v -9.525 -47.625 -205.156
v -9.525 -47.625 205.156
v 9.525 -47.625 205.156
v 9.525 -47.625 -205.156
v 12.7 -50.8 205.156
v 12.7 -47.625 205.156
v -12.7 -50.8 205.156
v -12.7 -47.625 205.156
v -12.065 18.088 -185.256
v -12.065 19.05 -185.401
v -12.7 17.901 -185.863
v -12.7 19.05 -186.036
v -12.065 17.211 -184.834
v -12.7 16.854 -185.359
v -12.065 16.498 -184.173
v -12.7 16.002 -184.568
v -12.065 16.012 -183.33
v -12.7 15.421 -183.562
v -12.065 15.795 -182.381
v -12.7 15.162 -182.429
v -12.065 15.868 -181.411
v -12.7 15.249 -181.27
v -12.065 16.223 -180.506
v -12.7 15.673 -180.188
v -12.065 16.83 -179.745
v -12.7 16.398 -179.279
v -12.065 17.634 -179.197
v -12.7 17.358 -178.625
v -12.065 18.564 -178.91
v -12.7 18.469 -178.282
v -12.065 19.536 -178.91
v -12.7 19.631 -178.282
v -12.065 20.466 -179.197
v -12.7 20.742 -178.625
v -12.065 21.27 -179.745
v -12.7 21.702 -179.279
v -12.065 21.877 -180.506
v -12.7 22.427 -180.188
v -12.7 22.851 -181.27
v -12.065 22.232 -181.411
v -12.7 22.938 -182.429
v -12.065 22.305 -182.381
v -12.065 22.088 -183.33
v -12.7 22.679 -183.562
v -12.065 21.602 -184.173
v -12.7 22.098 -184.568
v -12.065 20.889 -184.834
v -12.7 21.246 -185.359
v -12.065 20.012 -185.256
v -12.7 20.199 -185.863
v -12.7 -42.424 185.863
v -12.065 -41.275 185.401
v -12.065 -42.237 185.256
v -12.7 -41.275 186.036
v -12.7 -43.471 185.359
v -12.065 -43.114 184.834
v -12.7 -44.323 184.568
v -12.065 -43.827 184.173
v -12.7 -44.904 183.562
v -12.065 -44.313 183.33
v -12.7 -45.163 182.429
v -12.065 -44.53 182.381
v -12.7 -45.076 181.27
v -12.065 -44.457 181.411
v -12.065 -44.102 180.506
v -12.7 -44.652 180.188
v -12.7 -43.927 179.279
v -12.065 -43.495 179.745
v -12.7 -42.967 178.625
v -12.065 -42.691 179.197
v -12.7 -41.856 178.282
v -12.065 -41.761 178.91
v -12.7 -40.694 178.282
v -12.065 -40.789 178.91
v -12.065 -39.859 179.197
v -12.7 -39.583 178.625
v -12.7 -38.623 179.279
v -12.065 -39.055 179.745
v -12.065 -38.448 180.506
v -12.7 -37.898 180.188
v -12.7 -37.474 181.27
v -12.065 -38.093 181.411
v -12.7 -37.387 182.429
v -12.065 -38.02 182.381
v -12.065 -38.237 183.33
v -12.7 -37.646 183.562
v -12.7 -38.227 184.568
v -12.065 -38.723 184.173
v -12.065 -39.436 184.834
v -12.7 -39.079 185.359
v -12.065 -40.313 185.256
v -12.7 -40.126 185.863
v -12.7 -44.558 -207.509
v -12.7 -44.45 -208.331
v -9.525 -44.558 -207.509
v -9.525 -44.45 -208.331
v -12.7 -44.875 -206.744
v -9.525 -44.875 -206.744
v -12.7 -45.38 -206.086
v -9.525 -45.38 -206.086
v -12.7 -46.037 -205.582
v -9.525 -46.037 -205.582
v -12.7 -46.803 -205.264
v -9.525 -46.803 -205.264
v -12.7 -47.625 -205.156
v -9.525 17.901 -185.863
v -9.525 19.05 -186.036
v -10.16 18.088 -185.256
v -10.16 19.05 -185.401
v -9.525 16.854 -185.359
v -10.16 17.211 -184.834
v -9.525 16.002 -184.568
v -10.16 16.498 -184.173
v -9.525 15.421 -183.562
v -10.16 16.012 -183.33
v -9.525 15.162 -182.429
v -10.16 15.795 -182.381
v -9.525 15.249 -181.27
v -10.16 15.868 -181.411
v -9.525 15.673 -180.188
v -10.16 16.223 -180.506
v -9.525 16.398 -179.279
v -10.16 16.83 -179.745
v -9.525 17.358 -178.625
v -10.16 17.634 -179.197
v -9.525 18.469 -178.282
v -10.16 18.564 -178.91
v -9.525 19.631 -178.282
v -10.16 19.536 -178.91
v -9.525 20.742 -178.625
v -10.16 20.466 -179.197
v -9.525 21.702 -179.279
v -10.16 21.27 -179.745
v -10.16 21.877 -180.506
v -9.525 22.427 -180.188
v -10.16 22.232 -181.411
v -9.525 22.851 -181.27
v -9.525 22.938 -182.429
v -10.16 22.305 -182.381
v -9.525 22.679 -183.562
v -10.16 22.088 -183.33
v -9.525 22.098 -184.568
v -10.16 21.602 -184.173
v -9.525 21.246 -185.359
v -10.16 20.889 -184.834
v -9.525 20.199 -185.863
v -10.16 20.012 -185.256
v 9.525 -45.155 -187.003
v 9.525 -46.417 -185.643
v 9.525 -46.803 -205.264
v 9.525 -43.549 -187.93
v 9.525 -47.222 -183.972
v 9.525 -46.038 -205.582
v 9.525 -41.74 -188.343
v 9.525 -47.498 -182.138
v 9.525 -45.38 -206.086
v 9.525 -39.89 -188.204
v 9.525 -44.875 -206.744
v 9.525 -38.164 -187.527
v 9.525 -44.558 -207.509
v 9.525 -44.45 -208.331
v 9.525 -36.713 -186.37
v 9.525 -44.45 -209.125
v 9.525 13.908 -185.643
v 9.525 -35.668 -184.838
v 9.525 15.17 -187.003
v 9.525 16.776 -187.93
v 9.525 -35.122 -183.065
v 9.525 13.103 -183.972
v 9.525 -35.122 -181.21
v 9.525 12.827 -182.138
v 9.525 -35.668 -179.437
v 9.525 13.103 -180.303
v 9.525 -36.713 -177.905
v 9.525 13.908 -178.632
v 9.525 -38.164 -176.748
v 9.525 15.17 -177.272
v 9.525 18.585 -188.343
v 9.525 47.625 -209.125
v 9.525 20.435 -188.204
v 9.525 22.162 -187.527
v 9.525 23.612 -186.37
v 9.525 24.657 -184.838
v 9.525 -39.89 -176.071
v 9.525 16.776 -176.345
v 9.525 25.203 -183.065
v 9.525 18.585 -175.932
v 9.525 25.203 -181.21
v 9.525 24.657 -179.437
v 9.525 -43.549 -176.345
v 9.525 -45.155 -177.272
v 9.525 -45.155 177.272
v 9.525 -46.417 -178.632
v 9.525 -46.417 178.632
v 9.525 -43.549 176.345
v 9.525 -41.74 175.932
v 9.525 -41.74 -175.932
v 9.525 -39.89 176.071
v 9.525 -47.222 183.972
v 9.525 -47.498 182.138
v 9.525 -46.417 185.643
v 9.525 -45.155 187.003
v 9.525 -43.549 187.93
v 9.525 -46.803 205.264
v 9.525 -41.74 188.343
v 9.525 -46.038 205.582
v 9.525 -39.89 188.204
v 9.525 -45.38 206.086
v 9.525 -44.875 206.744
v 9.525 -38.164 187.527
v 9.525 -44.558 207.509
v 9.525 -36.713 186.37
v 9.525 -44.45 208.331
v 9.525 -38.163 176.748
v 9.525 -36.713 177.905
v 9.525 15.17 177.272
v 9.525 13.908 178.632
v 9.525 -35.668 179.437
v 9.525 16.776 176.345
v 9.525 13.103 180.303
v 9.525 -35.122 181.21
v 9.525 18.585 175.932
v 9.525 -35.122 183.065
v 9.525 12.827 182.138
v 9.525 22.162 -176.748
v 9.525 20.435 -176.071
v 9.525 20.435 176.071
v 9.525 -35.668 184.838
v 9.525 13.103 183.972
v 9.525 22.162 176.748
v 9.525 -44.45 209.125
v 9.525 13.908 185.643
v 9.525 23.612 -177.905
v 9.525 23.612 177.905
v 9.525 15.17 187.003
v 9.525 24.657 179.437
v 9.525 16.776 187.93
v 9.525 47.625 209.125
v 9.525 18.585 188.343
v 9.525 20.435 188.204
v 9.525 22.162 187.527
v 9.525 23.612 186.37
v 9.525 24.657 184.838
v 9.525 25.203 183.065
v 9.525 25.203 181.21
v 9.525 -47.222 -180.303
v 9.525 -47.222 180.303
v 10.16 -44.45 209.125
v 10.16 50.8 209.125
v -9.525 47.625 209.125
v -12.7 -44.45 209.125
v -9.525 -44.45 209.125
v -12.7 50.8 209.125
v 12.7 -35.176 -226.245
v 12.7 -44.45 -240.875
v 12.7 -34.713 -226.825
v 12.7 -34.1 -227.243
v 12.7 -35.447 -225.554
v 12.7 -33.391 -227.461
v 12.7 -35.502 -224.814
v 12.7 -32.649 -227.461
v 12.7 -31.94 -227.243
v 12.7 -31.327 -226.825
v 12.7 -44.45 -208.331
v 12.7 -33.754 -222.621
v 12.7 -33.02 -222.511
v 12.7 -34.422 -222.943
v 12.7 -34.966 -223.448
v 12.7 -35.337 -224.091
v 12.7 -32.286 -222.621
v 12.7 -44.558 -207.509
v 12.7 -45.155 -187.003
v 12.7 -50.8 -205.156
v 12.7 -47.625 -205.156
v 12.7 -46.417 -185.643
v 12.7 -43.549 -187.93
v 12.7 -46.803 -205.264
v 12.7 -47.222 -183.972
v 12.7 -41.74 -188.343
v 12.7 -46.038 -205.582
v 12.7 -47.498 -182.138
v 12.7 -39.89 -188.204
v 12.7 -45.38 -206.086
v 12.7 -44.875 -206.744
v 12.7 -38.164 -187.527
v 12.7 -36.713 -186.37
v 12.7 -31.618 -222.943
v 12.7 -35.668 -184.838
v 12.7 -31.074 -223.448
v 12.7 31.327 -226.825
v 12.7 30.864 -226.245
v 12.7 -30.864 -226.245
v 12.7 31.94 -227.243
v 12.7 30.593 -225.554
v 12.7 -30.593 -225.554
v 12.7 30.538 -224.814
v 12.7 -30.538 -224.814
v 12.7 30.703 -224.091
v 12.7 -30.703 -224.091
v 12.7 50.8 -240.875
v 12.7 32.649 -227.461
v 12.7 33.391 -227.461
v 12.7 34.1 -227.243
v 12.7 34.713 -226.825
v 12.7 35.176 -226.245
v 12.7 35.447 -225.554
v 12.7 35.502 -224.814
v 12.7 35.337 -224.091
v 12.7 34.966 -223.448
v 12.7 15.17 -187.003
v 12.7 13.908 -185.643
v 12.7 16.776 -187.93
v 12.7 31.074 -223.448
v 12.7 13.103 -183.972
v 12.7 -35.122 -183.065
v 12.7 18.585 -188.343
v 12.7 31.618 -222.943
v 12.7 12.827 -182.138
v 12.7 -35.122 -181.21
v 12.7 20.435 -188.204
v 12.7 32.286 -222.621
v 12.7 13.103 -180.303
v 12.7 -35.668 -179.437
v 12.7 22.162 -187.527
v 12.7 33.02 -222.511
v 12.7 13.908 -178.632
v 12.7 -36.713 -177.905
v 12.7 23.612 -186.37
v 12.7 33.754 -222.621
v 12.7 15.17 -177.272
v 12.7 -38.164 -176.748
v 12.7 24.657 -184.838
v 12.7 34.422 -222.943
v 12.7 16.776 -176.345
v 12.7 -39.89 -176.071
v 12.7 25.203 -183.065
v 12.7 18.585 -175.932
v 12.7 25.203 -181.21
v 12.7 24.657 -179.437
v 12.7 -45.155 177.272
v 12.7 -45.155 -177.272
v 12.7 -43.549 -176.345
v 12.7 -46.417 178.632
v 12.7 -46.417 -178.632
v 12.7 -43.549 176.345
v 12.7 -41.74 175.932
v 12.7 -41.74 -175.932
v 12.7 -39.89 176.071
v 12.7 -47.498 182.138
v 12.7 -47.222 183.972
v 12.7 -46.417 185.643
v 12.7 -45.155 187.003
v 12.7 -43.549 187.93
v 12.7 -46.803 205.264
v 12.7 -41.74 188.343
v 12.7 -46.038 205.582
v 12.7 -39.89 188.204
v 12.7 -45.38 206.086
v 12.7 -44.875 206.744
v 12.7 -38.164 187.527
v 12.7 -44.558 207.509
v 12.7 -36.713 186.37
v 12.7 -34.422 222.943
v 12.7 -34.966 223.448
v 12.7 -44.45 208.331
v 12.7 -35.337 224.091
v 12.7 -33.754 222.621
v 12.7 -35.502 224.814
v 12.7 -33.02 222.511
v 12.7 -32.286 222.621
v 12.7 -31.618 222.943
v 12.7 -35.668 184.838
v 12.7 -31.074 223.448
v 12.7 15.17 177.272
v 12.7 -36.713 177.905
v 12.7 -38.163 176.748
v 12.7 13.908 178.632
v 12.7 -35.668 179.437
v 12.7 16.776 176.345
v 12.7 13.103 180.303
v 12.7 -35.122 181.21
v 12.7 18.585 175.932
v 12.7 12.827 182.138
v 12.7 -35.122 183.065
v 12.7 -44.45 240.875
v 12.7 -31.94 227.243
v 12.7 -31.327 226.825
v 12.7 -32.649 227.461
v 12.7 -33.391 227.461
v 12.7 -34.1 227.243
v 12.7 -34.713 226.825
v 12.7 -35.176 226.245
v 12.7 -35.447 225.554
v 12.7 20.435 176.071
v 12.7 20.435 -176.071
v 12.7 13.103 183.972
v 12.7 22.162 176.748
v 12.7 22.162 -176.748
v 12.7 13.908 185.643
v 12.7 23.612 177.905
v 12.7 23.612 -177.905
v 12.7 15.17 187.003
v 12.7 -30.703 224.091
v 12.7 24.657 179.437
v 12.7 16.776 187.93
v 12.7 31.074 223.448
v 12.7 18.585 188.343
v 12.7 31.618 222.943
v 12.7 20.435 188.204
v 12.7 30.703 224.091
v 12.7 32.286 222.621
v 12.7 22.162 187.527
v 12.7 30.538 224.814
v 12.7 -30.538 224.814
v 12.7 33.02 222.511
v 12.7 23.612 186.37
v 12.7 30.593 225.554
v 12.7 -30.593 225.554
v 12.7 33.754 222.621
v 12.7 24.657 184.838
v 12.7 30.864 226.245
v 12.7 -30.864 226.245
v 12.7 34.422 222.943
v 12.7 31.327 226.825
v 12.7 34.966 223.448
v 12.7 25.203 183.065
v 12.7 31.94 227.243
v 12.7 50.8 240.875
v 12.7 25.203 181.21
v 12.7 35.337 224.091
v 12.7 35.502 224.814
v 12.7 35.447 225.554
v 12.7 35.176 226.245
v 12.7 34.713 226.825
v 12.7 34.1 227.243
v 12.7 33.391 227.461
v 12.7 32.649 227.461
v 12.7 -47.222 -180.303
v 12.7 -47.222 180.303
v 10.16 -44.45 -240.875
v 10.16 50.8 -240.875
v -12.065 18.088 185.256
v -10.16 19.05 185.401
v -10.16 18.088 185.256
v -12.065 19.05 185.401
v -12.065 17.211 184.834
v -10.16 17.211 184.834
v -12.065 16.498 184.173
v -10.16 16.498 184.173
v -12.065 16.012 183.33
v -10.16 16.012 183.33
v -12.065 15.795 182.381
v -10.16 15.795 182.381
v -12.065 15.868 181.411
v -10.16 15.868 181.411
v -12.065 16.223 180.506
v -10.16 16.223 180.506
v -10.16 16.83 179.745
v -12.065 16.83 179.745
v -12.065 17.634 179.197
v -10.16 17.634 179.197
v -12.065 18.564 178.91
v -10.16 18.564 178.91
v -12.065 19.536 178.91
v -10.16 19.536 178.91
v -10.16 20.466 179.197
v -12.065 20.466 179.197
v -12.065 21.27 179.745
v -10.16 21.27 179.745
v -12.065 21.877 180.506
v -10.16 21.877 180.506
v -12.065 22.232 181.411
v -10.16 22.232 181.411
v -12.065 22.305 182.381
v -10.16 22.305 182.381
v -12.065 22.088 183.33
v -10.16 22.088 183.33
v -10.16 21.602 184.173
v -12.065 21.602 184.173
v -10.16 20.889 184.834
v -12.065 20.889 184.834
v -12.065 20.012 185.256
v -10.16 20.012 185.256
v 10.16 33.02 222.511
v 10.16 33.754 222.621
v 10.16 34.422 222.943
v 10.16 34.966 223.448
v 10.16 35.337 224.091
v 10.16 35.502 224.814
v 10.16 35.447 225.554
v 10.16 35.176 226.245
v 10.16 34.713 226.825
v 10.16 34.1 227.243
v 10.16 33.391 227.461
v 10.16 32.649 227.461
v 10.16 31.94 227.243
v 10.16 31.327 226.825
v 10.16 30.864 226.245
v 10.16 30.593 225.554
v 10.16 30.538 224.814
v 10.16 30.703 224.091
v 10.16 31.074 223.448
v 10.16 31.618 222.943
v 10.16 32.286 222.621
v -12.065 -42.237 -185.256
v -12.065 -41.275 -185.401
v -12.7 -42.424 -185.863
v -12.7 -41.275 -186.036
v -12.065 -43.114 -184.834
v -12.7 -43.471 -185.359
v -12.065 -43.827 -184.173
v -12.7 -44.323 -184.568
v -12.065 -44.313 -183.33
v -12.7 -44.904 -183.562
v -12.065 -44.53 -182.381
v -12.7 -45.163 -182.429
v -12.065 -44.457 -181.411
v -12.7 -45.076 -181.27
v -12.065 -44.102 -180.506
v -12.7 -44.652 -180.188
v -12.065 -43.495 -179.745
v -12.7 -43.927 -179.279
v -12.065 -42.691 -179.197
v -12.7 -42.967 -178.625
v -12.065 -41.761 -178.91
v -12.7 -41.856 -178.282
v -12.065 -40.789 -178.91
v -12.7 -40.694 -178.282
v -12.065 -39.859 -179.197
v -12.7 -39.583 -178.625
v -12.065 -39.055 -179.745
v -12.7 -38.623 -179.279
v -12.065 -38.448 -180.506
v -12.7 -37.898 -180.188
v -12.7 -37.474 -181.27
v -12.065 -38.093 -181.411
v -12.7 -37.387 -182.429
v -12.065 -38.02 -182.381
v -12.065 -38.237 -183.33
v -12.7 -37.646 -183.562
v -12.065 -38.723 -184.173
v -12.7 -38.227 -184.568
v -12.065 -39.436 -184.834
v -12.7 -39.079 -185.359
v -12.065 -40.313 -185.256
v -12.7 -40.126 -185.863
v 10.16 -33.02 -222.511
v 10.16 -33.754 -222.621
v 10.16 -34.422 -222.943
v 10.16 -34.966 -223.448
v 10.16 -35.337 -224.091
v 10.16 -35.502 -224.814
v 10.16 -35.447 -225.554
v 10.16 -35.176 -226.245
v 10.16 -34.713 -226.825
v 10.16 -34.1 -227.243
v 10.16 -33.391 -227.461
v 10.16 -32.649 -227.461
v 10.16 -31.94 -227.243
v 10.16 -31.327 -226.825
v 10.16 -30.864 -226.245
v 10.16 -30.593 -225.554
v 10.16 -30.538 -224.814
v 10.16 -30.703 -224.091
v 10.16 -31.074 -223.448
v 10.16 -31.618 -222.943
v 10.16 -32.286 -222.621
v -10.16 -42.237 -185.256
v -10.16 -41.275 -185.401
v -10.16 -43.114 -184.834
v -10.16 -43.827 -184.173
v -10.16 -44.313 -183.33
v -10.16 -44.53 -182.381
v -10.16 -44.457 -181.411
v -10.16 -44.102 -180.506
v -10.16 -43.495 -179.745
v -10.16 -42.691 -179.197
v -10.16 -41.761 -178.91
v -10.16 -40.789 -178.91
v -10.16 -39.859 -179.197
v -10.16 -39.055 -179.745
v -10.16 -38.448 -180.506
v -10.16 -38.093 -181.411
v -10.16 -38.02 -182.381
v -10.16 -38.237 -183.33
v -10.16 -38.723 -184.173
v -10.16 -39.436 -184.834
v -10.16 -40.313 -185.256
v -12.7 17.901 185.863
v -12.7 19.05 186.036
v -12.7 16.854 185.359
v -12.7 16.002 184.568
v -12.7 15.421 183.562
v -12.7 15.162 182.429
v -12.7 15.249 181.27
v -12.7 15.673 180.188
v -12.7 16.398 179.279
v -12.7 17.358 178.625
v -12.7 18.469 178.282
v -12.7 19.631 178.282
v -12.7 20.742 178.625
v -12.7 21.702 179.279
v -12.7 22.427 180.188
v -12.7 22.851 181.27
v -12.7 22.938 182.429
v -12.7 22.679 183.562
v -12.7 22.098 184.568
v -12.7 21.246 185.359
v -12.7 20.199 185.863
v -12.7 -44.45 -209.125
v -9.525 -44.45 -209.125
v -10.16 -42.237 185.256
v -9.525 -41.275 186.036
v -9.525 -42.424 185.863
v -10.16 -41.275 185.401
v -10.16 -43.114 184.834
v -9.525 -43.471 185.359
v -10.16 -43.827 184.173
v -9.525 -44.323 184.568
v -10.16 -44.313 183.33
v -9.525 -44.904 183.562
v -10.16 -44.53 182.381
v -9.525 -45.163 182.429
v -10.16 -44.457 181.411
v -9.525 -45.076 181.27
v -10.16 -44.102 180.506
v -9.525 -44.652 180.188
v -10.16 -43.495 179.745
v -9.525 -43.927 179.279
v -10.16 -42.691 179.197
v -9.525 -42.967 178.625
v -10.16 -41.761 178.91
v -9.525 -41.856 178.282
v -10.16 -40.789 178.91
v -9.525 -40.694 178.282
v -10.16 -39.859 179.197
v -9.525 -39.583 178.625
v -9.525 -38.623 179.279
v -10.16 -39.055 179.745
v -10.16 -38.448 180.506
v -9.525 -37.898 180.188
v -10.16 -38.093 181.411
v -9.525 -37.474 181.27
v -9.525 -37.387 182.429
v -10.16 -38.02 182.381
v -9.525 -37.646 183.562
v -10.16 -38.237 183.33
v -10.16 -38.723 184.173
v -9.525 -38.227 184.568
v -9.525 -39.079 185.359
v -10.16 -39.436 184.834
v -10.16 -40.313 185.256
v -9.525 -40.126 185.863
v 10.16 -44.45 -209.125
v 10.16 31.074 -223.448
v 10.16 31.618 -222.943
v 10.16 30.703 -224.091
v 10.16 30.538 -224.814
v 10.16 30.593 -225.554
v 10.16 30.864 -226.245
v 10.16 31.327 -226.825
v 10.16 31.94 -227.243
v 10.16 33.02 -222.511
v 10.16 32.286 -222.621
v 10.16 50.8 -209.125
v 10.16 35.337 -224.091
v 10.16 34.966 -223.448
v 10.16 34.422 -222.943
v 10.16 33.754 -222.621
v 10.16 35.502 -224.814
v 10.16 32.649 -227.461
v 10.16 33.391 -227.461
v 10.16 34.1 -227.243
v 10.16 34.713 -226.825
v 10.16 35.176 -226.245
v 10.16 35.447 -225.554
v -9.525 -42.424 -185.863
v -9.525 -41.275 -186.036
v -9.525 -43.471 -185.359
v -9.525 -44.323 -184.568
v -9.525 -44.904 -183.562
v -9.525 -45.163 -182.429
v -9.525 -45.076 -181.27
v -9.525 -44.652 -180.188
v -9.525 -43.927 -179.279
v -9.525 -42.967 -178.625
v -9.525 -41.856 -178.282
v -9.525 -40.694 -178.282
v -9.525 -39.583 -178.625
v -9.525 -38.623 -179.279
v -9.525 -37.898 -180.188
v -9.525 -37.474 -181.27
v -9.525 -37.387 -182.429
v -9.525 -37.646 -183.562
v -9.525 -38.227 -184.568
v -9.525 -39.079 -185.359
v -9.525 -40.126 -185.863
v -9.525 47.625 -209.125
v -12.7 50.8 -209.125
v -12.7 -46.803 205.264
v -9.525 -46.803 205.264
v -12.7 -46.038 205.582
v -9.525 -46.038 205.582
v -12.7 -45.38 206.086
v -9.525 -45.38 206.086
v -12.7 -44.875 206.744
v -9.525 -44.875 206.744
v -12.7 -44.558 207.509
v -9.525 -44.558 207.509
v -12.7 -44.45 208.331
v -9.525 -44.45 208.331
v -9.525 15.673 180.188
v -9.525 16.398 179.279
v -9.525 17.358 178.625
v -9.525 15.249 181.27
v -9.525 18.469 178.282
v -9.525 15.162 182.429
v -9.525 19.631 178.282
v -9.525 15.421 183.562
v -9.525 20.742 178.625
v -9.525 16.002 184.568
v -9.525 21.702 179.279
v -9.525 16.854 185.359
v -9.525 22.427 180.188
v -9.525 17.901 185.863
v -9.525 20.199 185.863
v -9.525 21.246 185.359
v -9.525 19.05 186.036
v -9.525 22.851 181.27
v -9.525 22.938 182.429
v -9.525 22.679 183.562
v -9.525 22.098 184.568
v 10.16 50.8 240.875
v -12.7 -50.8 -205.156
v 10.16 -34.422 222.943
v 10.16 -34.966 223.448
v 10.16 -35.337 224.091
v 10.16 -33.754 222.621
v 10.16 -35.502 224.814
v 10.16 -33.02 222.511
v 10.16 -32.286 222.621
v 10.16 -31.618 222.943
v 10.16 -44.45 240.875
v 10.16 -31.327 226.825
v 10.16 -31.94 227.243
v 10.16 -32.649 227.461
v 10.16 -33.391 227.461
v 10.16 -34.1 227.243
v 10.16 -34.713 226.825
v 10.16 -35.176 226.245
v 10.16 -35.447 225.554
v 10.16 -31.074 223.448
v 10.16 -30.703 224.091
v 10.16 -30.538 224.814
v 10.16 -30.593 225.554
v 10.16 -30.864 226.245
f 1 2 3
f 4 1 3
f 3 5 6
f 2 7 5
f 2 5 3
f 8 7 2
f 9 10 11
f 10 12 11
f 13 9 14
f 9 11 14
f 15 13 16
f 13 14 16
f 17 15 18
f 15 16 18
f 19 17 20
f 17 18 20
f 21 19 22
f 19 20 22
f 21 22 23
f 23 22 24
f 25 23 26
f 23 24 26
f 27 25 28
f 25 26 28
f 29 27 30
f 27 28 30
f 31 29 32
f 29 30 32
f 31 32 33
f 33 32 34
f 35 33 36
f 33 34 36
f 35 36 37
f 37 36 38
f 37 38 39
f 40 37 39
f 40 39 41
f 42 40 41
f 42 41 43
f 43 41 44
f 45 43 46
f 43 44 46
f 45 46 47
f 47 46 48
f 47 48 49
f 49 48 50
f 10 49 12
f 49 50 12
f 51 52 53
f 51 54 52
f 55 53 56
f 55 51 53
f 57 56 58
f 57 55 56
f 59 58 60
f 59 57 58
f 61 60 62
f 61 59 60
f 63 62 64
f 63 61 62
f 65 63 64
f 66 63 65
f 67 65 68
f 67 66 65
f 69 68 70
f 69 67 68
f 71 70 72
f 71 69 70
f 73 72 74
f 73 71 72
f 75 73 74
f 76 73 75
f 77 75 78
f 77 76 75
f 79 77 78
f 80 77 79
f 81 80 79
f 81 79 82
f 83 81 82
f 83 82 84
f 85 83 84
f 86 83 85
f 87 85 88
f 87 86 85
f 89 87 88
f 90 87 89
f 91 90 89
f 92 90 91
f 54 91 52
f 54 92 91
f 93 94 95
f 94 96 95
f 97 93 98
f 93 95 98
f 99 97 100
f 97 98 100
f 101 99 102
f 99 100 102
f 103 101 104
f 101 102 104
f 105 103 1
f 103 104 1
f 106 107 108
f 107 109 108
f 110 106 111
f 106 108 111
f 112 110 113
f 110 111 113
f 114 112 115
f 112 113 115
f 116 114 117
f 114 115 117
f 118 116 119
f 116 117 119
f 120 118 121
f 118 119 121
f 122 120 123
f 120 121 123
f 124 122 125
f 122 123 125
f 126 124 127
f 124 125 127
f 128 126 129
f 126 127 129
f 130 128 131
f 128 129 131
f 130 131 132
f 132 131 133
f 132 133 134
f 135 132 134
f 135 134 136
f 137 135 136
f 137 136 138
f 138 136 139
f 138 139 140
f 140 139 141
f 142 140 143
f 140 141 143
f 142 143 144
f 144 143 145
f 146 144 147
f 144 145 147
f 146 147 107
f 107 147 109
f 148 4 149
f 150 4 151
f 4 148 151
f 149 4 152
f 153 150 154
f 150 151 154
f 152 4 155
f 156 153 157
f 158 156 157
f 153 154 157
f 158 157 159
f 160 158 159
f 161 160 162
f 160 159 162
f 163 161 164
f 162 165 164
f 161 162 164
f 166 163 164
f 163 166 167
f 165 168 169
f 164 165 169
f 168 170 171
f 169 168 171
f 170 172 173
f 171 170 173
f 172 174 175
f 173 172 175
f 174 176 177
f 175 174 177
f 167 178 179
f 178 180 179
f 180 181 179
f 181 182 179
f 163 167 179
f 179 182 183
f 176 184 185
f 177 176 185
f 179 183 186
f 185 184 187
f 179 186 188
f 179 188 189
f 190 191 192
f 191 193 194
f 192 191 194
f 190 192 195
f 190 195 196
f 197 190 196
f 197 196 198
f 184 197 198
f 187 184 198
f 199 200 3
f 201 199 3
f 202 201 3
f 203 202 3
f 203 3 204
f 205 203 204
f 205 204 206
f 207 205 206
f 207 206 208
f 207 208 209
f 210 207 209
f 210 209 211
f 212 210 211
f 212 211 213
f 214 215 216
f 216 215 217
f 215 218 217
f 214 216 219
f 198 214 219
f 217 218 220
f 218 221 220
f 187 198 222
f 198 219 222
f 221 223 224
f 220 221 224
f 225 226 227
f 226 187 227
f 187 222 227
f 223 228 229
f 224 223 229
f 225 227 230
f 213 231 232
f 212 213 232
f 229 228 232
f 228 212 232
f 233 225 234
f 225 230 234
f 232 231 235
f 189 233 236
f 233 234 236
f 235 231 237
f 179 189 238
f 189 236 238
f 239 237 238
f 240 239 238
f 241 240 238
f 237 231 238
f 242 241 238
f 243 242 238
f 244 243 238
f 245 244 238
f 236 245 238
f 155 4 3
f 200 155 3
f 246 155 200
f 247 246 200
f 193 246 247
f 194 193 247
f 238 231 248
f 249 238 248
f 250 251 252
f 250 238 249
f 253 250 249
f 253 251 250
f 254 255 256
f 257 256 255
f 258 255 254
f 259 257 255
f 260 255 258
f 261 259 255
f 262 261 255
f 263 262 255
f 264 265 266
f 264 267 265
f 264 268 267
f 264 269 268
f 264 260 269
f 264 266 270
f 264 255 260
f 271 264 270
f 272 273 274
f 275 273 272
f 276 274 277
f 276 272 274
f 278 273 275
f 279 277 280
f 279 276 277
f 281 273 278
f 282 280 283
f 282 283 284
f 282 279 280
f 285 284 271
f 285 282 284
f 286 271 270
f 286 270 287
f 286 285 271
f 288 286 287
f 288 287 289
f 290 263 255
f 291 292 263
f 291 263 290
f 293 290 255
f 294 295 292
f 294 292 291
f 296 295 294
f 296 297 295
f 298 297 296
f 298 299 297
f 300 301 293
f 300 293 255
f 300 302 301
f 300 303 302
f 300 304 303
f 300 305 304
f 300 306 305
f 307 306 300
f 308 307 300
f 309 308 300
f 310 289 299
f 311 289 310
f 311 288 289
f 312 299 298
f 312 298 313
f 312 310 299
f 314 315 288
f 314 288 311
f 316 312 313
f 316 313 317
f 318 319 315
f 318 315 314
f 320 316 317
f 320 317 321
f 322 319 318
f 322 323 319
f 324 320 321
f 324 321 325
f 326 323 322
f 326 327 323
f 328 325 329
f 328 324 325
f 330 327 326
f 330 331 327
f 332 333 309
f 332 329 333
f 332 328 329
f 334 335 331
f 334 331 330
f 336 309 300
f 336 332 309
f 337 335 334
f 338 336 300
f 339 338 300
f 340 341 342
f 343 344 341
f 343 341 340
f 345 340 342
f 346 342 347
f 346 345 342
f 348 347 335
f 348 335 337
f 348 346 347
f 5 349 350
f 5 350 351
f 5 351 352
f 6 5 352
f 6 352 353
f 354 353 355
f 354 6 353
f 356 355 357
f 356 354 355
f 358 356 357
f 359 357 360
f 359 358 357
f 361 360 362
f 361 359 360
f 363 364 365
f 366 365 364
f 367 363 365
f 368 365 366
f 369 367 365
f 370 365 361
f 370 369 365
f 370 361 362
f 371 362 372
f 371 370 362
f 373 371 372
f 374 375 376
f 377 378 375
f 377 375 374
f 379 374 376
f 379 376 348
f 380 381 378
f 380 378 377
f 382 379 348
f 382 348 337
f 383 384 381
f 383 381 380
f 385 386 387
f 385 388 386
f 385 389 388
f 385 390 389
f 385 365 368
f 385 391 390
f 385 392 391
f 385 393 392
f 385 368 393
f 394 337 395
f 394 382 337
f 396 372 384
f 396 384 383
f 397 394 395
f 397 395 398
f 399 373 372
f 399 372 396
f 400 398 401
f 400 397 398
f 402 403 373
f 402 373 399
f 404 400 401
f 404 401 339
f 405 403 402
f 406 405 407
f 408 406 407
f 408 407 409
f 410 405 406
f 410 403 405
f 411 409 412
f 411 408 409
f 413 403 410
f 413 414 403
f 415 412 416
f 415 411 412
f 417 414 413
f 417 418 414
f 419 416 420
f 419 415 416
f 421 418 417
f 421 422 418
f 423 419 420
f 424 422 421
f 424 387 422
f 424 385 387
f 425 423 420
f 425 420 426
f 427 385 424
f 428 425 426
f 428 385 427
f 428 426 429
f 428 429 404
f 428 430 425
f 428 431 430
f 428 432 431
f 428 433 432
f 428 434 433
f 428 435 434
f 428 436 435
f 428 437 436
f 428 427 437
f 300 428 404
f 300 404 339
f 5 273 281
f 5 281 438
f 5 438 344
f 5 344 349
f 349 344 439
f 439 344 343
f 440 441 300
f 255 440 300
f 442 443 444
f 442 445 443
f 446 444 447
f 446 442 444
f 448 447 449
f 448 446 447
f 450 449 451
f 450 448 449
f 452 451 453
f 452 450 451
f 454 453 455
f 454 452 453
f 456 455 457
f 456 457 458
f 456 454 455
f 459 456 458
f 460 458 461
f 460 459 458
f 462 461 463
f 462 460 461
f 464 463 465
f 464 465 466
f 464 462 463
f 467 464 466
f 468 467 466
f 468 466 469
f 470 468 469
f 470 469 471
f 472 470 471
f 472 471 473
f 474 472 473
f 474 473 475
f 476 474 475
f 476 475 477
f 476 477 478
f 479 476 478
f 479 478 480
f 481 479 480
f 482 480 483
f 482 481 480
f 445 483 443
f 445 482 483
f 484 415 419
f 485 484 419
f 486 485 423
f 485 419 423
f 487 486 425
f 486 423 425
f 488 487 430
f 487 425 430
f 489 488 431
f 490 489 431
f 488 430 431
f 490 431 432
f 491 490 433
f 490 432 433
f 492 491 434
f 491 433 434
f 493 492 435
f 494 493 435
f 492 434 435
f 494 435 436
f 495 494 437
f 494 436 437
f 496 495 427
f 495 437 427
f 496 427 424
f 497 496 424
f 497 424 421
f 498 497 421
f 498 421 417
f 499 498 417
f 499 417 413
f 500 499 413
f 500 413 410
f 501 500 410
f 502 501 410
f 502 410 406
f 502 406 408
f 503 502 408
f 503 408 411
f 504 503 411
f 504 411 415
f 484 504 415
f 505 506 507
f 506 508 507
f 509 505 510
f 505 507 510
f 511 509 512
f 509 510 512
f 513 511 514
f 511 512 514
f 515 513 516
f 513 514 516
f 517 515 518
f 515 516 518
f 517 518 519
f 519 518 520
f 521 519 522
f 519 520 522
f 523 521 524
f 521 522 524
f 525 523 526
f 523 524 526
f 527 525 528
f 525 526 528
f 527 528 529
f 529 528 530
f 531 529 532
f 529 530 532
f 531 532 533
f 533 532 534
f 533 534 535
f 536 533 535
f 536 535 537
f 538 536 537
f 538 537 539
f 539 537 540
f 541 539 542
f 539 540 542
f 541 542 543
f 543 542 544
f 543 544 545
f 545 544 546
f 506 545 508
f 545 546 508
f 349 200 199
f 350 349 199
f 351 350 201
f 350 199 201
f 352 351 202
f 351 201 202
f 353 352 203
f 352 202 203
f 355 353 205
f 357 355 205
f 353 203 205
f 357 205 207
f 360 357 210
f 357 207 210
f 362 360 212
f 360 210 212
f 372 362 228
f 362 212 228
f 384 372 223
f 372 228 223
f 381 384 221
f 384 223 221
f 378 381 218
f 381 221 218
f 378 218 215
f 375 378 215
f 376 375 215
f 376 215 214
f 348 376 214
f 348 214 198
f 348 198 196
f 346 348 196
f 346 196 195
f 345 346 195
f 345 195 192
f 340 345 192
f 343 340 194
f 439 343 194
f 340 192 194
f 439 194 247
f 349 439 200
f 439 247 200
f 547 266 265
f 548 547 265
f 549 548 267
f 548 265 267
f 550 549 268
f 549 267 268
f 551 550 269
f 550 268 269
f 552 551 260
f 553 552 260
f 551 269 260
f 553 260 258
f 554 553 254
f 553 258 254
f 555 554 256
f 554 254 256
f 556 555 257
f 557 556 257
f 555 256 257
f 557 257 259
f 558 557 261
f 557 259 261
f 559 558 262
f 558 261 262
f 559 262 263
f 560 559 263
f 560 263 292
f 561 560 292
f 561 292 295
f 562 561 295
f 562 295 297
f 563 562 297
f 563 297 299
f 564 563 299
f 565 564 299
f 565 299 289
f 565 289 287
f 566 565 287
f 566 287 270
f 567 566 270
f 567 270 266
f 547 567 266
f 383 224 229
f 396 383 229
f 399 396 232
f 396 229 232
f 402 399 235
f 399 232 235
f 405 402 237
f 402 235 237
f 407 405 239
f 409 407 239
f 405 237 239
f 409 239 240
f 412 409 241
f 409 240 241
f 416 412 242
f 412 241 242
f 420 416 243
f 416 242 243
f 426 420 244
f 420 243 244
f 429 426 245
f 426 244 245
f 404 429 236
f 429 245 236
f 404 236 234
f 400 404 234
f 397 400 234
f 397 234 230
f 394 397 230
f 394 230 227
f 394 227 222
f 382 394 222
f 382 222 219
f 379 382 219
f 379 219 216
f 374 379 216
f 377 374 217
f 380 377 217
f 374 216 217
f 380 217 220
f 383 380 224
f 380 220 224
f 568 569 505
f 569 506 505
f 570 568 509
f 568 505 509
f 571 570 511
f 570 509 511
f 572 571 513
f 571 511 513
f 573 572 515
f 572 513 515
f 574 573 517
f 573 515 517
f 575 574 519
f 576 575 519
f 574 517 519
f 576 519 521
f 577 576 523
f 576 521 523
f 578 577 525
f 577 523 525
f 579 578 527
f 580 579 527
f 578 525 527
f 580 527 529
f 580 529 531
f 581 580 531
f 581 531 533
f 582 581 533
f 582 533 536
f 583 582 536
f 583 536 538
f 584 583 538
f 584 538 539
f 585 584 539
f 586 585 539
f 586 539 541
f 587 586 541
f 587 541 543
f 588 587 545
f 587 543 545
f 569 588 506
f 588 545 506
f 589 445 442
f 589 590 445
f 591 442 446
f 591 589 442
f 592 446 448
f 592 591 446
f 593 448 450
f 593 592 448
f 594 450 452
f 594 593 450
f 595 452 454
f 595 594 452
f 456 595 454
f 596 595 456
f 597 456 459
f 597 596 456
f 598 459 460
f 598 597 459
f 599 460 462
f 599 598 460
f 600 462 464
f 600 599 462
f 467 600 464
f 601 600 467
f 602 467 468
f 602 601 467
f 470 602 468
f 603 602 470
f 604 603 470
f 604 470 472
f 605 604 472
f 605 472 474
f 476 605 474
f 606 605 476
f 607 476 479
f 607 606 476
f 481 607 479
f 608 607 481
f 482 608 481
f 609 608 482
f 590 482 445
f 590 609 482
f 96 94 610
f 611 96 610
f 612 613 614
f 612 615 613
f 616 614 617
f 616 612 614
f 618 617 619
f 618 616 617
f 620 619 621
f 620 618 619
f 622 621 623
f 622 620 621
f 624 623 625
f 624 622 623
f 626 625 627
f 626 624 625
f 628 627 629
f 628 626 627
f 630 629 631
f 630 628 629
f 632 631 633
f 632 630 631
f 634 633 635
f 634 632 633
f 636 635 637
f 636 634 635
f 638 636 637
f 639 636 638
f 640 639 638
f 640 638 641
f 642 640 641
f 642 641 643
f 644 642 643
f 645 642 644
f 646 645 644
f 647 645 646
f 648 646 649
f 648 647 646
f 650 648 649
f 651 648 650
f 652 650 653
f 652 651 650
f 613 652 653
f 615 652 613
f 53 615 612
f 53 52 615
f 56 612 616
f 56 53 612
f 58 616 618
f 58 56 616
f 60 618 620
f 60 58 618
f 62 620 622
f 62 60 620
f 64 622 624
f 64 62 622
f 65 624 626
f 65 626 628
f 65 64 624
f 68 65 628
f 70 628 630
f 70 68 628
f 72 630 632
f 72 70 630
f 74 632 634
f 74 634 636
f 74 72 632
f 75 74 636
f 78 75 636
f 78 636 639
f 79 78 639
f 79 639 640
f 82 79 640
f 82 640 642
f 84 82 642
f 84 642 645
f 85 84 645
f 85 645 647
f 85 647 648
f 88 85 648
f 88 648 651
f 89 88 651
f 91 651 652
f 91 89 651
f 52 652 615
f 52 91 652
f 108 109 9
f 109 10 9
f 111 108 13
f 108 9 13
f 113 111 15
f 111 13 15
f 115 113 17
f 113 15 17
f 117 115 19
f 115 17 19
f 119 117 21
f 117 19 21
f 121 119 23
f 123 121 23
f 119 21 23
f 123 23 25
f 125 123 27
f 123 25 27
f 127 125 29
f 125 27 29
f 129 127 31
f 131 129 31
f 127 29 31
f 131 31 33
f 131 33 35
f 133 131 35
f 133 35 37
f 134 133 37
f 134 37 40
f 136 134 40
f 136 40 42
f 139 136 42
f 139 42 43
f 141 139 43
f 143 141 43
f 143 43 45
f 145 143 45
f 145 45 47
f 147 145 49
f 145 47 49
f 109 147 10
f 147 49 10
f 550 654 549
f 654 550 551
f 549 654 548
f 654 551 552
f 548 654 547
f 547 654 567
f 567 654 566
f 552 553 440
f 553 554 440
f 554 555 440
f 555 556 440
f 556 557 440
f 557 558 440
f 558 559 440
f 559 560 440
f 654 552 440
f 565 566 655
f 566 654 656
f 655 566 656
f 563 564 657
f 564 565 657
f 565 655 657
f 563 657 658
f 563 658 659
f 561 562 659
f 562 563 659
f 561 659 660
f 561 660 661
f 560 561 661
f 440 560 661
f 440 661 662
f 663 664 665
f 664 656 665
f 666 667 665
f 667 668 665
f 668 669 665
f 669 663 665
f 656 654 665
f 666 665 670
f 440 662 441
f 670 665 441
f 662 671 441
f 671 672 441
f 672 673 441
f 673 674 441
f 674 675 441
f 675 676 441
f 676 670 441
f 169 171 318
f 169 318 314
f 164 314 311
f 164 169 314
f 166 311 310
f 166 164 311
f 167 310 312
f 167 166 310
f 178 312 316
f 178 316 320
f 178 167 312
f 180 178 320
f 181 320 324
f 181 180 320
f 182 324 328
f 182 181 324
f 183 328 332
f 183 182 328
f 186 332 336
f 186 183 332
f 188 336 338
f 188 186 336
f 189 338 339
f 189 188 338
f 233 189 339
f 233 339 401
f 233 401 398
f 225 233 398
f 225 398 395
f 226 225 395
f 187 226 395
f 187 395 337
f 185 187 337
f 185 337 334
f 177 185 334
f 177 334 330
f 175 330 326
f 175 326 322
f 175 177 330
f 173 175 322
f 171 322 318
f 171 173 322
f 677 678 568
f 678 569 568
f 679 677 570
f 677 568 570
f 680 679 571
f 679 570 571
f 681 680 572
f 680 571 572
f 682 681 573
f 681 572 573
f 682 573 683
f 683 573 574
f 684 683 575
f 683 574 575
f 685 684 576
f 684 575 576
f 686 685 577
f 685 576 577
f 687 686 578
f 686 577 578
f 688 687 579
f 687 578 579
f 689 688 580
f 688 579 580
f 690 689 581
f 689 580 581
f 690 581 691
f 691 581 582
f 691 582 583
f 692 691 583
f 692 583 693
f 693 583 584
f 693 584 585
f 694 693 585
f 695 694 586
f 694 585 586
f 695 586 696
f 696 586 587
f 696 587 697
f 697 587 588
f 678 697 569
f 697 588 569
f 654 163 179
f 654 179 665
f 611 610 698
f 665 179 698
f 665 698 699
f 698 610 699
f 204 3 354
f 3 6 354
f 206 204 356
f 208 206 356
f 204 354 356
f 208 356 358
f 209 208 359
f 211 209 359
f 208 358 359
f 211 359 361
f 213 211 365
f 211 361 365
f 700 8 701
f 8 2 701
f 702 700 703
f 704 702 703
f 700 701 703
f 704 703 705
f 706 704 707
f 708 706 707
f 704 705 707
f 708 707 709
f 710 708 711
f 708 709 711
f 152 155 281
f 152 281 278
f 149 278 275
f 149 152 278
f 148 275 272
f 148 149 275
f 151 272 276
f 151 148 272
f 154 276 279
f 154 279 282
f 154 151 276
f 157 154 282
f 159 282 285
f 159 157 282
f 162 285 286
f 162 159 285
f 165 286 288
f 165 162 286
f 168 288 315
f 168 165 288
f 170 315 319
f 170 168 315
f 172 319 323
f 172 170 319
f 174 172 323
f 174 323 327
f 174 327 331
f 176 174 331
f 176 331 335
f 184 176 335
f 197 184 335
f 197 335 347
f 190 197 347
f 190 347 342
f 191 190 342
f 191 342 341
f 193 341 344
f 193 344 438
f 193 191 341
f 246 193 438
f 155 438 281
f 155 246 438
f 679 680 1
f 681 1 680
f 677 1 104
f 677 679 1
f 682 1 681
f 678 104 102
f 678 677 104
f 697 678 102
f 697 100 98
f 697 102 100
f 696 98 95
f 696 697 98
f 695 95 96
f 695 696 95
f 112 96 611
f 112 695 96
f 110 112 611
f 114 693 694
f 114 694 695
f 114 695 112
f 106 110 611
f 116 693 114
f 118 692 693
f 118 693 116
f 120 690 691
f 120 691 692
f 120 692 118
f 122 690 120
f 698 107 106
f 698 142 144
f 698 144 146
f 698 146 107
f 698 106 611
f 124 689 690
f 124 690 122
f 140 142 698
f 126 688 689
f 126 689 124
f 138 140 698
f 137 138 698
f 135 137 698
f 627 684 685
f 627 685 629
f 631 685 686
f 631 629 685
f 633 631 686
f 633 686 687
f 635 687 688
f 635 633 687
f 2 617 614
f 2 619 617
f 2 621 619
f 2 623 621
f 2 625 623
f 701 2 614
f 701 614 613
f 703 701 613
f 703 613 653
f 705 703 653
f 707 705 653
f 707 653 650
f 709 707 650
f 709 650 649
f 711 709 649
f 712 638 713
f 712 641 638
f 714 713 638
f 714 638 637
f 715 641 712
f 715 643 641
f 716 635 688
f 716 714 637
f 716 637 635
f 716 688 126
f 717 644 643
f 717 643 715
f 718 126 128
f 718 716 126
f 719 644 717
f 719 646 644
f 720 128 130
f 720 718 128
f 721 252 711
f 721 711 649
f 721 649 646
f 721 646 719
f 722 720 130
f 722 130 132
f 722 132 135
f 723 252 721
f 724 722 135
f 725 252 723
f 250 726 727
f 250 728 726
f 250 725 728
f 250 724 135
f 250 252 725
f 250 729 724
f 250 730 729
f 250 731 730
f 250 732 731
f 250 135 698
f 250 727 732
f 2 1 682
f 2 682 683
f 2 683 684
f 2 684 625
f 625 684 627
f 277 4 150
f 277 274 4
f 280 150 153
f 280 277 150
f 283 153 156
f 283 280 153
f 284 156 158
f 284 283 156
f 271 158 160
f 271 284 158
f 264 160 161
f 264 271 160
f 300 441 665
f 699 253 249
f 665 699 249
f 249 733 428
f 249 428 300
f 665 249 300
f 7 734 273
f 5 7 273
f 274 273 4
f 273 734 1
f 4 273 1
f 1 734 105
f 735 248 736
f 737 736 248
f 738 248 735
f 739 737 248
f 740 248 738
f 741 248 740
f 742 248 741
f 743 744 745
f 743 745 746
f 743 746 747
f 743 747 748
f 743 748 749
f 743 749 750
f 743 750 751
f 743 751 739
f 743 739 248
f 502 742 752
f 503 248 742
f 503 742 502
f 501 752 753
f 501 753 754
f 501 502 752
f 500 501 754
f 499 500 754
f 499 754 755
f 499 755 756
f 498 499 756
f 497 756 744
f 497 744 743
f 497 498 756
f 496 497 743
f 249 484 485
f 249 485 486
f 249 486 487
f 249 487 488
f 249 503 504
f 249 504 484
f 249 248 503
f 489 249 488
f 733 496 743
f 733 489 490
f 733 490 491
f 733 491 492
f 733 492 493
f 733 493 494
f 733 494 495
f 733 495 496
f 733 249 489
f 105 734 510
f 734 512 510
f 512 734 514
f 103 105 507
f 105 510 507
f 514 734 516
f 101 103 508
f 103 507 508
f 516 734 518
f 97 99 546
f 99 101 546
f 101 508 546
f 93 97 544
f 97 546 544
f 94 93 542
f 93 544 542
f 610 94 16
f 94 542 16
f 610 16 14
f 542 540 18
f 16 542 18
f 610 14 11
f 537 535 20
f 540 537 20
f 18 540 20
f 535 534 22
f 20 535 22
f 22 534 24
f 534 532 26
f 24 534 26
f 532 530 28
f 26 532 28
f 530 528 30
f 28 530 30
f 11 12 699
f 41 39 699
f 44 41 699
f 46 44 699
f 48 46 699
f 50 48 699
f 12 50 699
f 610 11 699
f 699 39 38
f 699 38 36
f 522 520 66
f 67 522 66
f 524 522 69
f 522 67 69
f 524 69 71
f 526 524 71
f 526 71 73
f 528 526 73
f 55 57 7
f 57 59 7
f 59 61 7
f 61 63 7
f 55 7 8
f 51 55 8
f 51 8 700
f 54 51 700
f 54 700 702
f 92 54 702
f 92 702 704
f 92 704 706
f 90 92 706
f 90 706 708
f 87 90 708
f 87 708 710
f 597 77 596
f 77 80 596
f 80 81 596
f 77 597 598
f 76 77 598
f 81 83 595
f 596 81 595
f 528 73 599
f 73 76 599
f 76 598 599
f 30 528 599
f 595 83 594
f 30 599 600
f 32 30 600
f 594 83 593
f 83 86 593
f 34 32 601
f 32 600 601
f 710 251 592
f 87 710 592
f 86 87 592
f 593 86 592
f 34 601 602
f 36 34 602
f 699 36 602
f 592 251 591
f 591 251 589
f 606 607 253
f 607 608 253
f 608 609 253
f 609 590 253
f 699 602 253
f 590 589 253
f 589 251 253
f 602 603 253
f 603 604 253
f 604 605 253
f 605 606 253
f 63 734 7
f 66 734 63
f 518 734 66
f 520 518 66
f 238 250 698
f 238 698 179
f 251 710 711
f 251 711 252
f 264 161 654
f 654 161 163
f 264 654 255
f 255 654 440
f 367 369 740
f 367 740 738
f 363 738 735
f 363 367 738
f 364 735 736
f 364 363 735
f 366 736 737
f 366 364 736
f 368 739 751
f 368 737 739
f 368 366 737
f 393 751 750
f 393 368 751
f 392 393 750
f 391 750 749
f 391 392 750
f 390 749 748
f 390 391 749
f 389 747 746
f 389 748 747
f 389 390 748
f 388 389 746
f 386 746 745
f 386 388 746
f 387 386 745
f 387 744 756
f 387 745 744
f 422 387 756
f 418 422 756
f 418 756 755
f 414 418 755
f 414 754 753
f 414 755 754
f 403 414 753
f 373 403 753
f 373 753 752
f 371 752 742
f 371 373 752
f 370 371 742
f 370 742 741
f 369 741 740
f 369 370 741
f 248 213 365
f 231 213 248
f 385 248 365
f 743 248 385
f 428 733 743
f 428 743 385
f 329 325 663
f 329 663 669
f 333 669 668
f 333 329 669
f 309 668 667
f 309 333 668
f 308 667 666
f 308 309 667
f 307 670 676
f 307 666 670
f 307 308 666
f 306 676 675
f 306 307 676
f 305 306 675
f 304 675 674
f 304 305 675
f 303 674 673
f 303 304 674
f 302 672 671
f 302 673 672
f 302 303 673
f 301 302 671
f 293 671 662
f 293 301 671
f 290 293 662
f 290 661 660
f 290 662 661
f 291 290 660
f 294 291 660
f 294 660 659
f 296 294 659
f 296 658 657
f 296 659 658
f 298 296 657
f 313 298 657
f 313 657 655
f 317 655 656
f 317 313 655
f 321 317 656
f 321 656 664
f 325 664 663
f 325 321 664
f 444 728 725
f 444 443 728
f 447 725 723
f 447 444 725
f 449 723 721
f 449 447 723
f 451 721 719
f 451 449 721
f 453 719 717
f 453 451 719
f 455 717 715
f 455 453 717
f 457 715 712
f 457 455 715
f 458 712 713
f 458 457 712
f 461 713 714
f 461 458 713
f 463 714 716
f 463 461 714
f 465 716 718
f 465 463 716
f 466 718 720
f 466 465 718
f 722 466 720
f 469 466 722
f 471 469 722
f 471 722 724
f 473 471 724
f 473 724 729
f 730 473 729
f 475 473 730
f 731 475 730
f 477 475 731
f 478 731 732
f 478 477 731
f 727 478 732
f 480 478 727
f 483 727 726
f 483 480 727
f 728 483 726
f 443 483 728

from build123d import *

# Parameters (mm, degrees)
SKETCH1_W                        = 25.4
SKETCH1_H                        = 101.6
SKETCH1_W_2                      = 19.05
SKETCH1_H_2                      = 95.25
EXTRUDE_THIN1_DEPTH              = 240.875
SKETCH2_W                        = 31.75
SKETCH2_H                        = 101.6
CUT_EXTRUDE1_DEPTH               = 22.86
SKETCH3_W                        = 35.71875
SKETCH3_H                        = 6.35
CUT_EXTRUDE2_DEPTH               = 26.4
F_10_CLEARANCE_HOLE1_D           = 4.9784
MIRROR2_COPY_1_D                 = 4.9784
FILLET1_R                        = 3.175
SKETCH7_R                        = 6.223
CUT_EXTRUDE3_DEPTH               = 3.175
F_1_4_CLEARANCE_HOLE1_AT_2_COUNT = 2
F_1_4_CLEARANCE_HOLE1_AT_2_PITCH = 60.325


with BuildPart() as part:
    # Sketch1 → Extrude-Thin1 (new body, symmetric)
    with BuildSketch(Plane.XY):
        Rectangle(SKETCH1_W, SKETCH1_H)
        Rectangle(SKETCH1_W_2, SKETCH1_H_2, mode=Mode.SUBTRACT)
    extrude(amount=EXTRUDE_THIN1_DEPTH, both=True)

    # Sketch2 → Cut-Extrude1 (cut)
    with BuildSketch(Plane.ZY.offset(12.7)):
        with Locations((225, 0)):
            Rectangle(SKETCH2_W, SKETCH2_H)
    cut_extrude1 = extrude(amount=-CUT_EXTRUDE1_DEPTH, mode=Mode.SUBTRACT)

    # Sketch3 → Cut-Extrude2 (cut, through all)
    with BuildSketch(Plane.ZY.offset(12.7)):
        with Locations((223.015625, -47.625)):
            Rectangle(SKETCH3_W, SKETCH3_H)
    cut_extrude2 = extrude(amount=-CUT_EXTRUDE2_DEPTH, mode=Mode.SUBTRACT)

    # #10 Clearance Hole1 (through all)
    with Locations(Plane.ZY.offset(-10.16)):
        with Locations((225, 33.02)):
            f_10_clearance_hole1 = Hole(F_10_CLEARANCE_HOLE1_D / 2)

    # Mirror1: #10 Clearance Hole1 across plane
    add(f_10_clearance_hole1.mirror(Plane.ZX), mode=Mode.SUBTRACT)

    # Mirror2: Cut-Extrude1, Cut-Extrude2, #10 Clearance Hole1 across plane
    add(cut_extrude1.mirror(Plane.XY), mode=Mode.SUBTRACT)
    add(cut_extrude2.mirror(Plane.XY), mode=Mode.SUBTRACT)
    add(f_10_clearance_hole1.mirror(Plane.XY), mode=Mode.SUBTRACT)

    # Mirror2 copy 1 (through all)
    with Locations(Plane(origin=(10.16, 0, 0), x_dir=(0, 0, -1), z_dir=(-1, 0, 0))):
        with Locations((225, 33.02)):
            Hole(MIRROR2_COPY_1_D / 2)

    # Fillet1
    fillet1_edges = [part.edges().sort_by_distance(p)[0] for p in [
        (11.1125, -44.45, 205.15625),
        (-11.1125, -44.45, 205.15625),
        (-11.1125, -44.45, -205.15625),
        (11.1125, -44.45, -205.15625),
    ]]
    fillet(fillet1_edges, radius=FILLET1_R)

    # Sketch7 → Cut-Extrude3 (cut)
    with BuildSketch(Plane.ZY.offset(-9.525)):
        with Locations(Location((182.1375, -41.275, 0), (0, 0, 270))):  # turned: the seam where the file's is
            Circle(SKETCH7_R)
        with Locations(Location((182.1375, 19.05, 0), (0, 0, 270))):  # turned: the seam where the file's is
            Circle(SKETCH7_R)
    cut_extrude3 = extrude(amount=-CUT_EXTRUDE3_DEPTH, mode=Mode.SUBTRACT)

    # Sketch8 → 1/4 Clearance Hole1 (revolve, cut)
    with BuildSketch(Plane(origin=(-12.7, 19.05, 182.1375), x_dir=(0, 0, 1), z_dir=(0, 1, 0))):
        Polygon((0, 0), (0, 3.175), (3.8989, 3.175), (3.2639, 2.54), (3.2639, 0.635), (3.8989, 0), align=None)
    f_1_4_clearance_hole1 = revolve(axis=Axis((-19.05, 19.05, 182.1375), (1, 0, 0)), mode=Mode.SUBTRACT)

    # 1/4 Clearance Hole1 at 2: 1/4 Clearance Hole1 ×2
    with Locations(*[(0, -i * F_1_4_CLEARANCE_HOLE1_AT_2_PITCH, 0) for i in range(1, F_1_4_CLEARANCE_HOLE1_AT_2_COUNT)]):
        add(f_1_4_clearance_hole1, mode=Mode.SUBTRACT)

    # Mirror3: Cut-Extrude3, 1/4 Clearance Hole1 across plane
    add(cut_extrude3.mirror(Plane.XY), mode=Mode.SUBTRACT)
    add(f_1_4_clearance_hole1.mirror(Plane.XY), mode=Mode.SUBTRACT)

    # Mirror3 copy 1 sketch → Mirror3 copy 1 (revolve, cut)
    with BuildSketch(Plane(origin=(-12.7, -41.275, -182.1375), x_dir=(0, 0, -1), z_dir=(0, 1, 0))):
        Polygon((0, 0), (0, -3.175), (3.8989, -3.175), (3.2639, -2.54), (3.2639, -0.635), (3.8989, 0), align=None)
    revolve(axis=Axis((-19.05, -41.275, -182.1375), (-1, 0, 0)), mode=Mode.SUBTRACT)


solid = part.part
